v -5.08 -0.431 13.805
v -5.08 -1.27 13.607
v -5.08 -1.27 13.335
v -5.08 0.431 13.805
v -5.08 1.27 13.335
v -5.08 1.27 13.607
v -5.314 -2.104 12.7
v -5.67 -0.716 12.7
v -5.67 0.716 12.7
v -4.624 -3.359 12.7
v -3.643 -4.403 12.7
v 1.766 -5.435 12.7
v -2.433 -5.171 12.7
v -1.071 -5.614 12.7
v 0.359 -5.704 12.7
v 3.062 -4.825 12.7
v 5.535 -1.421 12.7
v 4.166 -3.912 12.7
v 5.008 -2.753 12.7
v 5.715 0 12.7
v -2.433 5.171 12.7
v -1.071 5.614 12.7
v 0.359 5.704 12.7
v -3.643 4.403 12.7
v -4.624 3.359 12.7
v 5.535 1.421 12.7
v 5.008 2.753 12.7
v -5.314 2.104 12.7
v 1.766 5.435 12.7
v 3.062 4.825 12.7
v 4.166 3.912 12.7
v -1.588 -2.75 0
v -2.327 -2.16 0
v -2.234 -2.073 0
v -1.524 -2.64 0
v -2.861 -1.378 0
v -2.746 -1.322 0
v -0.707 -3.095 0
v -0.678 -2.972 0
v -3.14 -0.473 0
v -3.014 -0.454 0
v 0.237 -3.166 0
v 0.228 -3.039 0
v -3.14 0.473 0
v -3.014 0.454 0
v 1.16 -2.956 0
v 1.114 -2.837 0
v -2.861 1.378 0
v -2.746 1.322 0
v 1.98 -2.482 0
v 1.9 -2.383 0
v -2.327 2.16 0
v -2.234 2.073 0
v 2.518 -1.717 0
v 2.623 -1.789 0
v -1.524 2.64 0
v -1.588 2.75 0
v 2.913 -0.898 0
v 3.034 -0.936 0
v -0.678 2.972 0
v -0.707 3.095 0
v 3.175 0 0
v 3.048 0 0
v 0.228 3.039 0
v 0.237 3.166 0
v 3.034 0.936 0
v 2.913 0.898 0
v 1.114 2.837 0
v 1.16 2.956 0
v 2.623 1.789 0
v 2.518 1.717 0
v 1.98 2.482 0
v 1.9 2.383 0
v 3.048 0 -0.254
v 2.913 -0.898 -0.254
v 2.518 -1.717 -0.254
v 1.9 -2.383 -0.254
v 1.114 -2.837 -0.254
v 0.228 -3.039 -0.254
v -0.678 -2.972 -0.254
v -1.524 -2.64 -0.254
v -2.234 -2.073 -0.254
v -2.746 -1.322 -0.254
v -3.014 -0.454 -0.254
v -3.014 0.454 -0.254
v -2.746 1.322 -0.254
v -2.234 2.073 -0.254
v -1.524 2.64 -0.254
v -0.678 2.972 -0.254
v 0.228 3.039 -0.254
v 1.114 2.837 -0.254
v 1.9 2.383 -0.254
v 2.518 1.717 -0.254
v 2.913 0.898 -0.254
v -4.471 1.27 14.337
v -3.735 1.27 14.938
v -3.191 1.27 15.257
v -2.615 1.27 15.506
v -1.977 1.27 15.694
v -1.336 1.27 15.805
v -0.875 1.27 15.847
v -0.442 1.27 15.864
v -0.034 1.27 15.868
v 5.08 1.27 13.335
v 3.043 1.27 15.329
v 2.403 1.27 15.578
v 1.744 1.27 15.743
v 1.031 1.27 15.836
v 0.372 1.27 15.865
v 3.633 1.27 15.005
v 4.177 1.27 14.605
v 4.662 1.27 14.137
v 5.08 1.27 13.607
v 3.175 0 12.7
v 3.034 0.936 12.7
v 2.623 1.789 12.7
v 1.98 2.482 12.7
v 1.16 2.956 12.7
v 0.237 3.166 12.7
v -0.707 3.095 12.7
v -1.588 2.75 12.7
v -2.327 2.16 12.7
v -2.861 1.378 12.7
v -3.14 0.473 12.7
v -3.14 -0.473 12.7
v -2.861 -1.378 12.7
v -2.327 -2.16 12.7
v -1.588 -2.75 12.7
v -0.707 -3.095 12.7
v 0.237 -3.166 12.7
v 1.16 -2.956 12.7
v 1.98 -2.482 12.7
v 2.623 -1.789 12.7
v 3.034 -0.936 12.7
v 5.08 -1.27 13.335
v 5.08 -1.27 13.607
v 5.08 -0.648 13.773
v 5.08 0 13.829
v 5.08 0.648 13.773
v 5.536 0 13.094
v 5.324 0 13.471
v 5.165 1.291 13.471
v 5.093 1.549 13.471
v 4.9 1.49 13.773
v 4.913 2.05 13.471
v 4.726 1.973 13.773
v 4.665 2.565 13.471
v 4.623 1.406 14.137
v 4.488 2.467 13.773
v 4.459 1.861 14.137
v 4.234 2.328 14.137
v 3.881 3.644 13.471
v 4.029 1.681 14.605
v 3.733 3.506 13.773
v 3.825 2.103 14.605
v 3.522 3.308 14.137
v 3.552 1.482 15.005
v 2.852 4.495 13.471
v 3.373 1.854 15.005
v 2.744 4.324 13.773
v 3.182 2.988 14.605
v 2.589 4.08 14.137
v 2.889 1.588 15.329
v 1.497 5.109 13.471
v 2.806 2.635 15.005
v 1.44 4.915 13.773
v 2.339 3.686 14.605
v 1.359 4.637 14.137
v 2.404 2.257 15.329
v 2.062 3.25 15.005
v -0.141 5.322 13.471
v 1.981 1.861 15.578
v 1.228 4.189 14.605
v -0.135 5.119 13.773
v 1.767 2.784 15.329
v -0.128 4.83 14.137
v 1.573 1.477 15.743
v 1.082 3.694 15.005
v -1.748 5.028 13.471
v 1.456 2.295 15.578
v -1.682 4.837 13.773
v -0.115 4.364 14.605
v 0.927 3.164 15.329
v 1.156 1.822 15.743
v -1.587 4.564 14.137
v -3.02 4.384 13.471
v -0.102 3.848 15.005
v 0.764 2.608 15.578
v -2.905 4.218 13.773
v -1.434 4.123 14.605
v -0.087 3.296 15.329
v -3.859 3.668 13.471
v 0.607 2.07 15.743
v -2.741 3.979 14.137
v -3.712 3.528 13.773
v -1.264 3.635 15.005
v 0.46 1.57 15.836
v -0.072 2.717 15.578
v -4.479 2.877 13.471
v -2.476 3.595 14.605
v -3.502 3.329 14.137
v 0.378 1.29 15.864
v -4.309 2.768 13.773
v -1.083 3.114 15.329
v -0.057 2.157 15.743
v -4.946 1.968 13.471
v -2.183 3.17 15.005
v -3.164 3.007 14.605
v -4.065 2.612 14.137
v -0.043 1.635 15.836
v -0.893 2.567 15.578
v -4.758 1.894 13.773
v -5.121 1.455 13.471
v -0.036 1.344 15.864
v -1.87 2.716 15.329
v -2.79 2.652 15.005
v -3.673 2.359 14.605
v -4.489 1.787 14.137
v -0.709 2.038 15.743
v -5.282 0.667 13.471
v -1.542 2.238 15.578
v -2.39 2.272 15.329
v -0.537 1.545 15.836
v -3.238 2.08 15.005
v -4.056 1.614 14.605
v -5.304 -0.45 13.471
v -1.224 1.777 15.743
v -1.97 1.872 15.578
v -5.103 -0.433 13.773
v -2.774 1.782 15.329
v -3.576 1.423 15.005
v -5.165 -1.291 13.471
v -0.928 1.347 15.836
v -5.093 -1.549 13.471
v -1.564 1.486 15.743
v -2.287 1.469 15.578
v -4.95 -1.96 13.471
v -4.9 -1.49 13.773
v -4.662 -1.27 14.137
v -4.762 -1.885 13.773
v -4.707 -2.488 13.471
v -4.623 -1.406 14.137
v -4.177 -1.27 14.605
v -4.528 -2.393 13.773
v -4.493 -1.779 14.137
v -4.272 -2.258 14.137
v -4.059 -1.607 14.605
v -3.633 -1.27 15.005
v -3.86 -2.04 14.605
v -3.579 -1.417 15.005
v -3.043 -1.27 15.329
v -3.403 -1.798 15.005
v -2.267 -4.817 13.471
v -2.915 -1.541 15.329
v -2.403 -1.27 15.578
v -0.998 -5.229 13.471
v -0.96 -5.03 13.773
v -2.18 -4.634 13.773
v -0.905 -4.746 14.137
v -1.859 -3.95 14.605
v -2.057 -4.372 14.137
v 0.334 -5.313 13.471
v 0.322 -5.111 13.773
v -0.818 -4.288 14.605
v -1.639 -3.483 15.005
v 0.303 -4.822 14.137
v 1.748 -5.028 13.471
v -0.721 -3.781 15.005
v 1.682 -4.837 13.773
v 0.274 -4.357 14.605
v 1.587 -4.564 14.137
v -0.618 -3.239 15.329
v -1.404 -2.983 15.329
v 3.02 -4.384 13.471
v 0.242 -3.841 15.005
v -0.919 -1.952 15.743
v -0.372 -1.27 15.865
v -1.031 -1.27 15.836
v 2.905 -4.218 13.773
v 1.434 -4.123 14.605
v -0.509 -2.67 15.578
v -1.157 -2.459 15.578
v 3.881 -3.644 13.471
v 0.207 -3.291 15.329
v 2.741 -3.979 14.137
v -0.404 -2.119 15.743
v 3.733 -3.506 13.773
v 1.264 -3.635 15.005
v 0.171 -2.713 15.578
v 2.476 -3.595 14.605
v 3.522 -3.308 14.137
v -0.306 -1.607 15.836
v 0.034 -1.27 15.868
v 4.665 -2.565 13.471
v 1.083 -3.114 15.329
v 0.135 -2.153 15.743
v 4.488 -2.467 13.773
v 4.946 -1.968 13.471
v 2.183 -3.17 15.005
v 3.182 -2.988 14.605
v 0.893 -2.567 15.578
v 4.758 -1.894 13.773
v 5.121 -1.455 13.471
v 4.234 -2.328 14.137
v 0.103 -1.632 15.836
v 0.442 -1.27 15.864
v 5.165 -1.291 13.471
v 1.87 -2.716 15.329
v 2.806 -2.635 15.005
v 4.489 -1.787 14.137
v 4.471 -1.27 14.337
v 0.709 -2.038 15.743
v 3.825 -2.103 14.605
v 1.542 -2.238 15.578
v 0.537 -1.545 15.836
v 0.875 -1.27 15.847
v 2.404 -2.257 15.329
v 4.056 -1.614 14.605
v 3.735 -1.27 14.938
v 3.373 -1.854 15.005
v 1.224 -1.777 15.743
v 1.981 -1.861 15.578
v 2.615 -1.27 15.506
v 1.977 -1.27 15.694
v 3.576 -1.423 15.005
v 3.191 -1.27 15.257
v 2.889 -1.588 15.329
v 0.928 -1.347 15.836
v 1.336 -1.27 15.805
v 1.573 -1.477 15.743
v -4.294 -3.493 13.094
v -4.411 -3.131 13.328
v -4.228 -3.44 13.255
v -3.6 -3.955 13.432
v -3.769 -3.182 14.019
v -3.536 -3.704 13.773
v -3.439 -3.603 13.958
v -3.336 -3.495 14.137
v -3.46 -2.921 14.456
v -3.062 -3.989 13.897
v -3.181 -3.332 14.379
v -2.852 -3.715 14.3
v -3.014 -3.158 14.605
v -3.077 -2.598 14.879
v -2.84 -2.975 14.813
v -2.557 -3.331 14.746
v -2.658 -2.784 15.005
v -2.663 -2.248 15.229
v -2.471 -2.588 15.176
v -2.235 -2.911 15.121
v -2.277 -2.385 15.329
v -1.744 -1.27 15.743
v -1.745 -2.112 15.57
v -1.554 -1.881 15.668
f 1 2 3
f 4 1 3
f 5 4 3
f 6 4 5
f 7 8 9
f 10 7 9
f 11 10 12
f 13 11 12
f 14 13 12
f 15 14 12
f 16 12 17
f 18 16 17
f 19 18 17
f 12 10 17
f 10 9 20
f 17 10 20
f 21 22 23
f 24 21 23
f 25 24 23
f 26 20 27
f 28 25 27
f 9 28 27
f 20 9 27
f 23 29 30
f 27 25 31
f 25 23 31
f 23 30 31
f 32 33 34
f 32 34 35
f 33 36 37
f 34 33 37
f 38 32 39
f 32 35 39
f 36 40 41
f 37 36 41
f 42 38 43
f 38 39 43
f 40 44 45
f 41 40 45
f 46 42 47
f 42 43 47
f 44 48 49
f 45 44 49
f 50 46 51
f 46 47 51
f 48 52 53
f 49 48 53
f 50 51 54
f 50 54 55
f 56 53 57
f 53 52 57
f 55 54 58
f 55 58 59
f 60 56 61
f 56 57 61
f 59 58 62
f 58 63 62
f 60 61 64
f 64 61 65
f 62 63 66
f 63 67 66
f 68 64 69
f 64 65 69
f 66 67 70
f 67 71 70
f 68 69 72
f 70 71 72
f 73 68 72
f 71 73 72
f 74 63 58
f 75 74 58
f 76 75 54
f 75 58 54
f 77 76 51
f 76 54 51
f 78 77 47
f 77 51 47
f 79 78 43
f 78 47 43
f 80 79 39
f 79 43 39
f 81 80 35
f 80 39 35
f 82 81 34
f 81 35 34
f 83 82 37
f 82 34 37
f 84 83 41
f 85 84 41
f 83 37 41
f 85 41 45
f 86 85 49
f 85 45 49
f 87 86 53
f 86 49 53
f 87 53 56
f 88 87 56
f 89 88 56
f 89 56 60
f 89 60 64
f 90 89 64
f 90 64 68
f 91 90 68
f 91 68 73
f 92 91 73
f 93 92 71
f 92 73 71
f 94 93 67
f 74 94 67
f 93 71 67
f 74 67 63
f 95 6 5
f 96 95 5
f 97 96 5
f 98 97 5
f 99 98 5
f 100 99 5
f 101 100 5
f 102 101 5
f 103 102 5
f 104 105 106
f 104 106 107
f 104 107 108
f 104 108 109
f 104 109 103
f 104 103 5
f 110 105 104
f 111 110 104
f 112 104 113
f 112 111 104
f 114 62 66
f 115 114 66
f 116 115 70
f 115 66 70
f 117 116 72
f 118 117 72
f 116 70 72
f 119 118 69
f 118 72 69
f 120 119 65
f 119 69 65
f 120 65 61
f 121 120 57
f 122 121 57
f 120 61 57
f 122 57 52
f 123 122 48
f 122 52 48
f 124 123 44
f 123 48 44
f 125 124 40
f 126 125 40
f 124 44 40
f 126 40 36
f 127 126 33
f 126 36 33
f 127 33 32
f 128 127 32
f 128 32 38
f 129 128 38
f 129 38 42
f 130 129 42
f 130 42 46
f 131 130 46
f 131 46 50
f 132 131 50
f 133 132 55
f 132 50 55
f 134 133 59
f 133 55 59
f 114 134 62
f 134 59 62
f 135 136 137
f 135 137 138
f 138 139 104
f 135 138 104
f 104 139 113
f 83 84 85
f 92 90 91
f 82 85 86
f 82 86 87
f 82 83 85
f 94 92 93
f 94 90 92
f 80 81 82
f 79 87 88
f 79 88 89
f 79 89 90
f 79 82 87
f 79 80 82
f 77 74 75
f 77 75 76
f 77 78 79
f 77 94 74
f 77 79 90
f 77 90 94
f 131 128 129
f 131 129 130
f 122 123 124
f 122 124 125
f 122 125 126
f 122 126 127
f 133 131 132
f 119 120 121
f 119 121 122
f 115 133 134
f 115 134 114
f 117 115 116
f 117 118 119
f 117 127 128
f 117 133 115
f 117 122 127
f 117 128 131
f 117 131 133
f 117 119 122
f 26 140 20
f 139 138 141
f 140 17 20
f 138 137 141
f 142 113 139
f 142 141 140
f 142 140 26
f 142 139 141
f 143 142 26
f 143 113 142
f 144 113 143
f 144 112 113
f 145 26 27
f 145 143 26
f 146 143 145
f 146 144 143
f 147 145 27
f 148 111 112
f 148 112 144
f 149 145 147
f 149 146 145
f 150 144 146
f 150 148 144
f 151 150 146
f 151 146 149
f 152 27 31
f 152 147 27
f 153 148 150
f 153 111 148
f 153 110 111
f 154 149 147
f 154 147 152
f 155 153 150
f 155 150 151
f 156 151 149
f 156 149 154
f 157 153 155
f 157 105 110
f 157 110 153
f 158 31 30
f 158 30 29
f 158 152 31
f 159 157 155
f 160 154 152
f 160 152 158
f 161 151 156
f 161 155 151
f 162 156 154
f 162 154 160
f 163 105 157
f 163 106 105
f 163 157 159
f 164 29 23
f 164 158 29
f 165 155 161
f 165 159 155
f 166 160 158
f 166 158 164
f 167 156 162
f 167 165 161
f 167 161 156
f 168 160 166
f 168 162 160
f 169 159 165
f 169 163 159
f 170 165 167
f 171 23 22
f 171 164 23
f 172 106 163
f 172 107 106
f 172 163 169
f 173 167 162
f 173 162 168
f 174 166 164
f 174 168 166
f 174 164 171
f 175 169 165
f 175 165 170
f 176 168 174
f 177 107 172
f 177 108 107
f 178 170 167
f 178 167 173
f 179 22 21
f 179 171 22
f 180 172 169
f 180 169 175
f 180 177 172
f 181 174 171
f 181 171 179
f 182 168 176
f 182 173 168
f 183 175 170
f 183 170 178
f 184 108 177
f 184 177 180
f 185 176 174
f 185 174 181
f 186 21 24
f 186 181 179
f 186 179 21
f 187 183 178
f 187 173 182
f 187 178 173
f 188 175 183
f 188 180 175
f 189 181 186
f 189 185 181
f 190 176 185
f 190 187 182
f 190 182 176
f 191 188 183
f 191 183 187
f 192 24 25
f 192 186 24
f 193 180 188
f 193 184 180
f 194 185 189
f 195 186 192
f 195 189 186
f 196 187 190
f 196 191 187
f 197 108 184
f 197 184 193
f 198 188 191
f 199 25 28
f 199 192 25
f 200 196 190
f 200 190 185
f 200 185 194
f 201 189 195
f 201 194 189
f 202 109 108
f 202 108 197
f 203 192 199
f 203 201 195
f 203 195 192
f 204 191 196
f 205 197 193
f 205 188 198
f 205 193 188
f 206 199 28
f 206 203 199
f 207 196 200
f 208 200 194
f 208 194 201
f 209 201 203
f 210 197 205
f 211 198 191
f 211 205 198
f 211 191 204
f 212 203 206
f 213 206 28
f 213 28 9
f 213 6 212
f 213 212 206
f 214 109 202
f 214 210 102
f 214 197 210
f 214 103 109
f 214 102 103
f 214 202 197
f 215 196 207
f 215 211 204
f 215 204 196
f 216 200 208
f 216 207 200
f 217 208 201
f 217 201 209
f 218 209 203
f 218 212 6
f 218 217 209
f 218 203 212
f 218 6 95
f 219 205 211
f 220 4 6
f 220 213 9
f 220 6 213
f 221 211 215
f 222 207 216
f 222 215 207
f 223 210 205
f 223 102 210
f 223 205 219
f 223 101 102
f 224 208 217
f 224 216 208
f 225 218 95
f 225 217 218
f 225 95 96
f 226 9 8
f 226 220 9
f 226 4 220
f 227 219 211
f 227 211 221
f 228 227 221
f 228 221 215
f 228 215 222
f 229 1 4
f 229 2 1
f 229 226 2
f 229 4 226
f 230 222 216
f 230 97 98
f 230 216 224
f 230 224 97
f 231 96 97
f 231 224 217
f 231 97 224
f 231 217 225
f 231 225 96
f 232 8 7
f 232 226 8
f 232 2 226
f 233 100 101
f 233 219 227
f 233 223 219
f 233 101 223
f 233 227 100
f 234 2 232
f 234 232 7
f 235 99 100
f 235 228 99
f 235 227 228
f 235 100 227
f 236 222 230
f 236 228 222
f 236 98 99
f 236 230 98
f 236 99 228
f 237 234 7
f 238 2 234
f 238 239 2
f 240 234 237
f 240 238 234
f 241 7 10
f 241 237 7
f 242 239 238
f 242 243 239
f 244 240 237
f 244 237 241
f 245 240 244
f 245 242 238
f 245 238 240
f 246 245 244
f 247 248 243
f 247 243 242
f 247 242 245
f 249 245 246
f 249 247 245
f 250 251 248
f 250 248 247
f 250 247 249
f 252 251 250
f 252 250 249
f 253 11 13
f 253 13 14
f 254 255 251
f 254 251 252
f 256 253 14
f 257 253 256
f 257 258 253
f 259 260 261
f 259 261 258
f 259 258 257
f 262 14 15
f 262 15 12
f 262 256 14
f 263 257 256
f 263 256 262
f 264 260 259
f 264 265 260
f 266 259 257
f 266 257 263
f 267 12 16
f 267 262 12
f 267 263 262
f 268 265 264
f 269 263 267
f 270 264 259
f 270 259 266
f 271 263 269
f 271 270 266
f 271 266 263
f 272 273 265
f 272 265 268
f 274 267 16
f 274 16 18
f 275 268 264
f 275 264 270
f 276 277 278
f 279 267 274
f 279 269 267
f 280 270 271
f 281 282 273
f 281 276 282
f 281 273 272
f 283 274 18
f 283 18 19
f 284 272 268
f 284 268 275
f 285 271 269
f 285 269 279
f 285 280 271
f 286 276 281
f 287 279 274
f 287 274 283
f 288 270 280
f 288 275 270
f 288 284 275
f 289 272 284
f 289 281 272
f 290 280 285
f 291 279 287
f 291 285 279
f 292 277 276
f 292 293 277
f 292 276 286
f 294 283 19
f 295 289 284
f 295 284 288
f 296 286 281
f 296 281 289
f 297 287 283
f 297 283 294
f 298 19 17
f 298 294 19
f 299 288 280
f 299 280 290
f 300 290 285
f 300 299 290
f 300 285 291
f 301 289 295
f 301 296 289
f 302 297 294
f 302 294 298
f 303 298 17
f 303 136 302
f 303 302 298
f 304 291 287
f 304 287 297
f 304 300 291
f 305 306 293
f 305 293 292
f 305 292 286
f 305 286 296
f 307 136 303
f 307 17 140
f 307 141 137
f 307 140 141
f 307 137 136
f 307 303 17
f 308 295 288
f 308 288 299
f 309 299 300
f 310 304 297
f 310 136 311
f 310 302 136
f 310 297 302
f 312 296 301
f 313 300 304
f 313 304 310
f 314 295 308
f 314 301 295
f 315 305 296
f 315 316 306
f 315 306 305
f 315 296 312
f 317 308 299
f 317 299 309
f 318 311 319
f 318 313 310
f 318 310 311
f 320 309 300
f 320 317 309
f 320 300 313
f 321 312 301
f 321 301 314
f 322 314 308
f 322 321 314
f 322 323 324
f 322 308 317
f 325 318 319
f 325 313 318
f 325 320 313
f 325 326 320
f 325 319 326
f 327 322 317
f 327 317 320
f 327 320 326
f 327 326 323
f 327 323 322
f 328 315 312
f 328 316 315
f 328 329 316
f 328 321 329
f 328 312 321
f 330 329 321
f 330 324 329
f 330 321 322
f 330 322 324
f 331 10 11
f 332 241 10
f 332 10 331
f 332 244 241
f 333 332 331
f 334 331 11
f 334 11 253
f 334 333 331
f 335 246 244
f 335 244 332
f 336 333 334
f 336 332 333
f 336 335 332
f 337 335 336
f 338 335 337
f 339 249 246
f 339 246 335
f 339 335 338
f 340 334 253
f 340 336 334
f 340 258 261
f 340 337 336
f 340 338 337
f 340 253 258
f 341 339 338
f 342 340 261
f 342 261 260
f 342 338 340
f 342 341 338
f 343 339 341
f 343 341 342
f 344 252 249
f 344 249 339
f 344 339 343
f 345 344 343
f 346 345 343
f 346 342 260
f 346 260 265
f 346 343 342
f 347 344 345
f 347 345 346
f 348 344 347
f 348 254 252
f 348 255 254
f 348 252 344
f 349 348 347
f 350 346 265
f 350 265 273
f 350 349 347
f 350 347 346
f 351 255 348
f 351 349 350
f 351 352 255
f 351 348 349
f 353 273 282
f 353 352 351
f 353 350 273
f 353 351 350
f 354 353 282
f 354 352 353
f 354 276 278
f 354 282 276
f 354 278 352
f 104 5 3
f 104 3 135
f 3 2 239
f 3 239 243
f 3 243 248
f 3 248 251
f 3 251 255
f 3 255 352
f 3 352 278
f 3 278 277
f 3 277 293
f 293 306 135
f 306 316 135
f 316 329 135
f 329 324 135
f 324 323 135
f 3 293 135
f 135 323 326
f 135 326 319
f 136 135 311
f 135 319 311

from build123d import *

# Parameters (mm, degrees)
F2_R     = 5.715
F3_DEPTH = 3.175
F5_W     = 10.16
F5_H     = 2.54
F6_DEPTH = 2.54
F0_R     = 3.175
F7_DEPTH = 12.7
F8_R     = 3.048
F9_DEPTH = 0.254


# Not quite as in the source:
# - a fillet or chamfer that OpenCascade refuses, or shapes differently, is made with other operations: its cross-section is extruded or revolved along the edge and cut away or added


with BuildPart() as f3:
    # F2 (on offset) → F3 (new body)
    with BuildSketch(Plane.XY.offset(12.7)):
        Circle(F2_R)
    extrude(amount=F3_DEPTH)

    # F4: fillet of radius 5.08 on 1 edges, made by hand

    # F4_s1 → F4_t2 (revolve, cut)
    with BuildSketch(Plane.XZ):
        with BuildLine():
            ThreePointArc((5.715, 12.7), (3.8455202921, 15.0071134838), (1.0057139607, 15.875))
            Line((1.0057139607, 15.875), (5.715, 15.875))
            Line((5.715, 15.875), (5.715, 12.7))
        make_face()
    revolve(axis=Axis((0, 0, 15.875), (0, 0, 1)), mode=Mode.SUBTRACT)

    # F5 (on face) → F6 (cut)
    with BuildSketch(Plane.XY.offset(15.875)):
        Rectangle(F5_W, F5_H)
    extrude(amount=-F6_DEPTH, mode=Mode.SUBTRACT)


with BuildPart() as f7:
    # F0 (on Top) → F7 (new body)
    with BuildSketch(Plane.XY):
        Circle(F0_R)
    extrude(amount=F7_DEPTH)

    # F8 (on face) → F9 (join)
    with BuildSketch(Plane(origin=(0, 0, 0), x_dir=(1, 0, 0), z_dir=(0, 0, -1))):
        Circle(F8_R)
    extrude(amount=F9_DEPTH)


solid = Compound([f3.part, f7.part])
